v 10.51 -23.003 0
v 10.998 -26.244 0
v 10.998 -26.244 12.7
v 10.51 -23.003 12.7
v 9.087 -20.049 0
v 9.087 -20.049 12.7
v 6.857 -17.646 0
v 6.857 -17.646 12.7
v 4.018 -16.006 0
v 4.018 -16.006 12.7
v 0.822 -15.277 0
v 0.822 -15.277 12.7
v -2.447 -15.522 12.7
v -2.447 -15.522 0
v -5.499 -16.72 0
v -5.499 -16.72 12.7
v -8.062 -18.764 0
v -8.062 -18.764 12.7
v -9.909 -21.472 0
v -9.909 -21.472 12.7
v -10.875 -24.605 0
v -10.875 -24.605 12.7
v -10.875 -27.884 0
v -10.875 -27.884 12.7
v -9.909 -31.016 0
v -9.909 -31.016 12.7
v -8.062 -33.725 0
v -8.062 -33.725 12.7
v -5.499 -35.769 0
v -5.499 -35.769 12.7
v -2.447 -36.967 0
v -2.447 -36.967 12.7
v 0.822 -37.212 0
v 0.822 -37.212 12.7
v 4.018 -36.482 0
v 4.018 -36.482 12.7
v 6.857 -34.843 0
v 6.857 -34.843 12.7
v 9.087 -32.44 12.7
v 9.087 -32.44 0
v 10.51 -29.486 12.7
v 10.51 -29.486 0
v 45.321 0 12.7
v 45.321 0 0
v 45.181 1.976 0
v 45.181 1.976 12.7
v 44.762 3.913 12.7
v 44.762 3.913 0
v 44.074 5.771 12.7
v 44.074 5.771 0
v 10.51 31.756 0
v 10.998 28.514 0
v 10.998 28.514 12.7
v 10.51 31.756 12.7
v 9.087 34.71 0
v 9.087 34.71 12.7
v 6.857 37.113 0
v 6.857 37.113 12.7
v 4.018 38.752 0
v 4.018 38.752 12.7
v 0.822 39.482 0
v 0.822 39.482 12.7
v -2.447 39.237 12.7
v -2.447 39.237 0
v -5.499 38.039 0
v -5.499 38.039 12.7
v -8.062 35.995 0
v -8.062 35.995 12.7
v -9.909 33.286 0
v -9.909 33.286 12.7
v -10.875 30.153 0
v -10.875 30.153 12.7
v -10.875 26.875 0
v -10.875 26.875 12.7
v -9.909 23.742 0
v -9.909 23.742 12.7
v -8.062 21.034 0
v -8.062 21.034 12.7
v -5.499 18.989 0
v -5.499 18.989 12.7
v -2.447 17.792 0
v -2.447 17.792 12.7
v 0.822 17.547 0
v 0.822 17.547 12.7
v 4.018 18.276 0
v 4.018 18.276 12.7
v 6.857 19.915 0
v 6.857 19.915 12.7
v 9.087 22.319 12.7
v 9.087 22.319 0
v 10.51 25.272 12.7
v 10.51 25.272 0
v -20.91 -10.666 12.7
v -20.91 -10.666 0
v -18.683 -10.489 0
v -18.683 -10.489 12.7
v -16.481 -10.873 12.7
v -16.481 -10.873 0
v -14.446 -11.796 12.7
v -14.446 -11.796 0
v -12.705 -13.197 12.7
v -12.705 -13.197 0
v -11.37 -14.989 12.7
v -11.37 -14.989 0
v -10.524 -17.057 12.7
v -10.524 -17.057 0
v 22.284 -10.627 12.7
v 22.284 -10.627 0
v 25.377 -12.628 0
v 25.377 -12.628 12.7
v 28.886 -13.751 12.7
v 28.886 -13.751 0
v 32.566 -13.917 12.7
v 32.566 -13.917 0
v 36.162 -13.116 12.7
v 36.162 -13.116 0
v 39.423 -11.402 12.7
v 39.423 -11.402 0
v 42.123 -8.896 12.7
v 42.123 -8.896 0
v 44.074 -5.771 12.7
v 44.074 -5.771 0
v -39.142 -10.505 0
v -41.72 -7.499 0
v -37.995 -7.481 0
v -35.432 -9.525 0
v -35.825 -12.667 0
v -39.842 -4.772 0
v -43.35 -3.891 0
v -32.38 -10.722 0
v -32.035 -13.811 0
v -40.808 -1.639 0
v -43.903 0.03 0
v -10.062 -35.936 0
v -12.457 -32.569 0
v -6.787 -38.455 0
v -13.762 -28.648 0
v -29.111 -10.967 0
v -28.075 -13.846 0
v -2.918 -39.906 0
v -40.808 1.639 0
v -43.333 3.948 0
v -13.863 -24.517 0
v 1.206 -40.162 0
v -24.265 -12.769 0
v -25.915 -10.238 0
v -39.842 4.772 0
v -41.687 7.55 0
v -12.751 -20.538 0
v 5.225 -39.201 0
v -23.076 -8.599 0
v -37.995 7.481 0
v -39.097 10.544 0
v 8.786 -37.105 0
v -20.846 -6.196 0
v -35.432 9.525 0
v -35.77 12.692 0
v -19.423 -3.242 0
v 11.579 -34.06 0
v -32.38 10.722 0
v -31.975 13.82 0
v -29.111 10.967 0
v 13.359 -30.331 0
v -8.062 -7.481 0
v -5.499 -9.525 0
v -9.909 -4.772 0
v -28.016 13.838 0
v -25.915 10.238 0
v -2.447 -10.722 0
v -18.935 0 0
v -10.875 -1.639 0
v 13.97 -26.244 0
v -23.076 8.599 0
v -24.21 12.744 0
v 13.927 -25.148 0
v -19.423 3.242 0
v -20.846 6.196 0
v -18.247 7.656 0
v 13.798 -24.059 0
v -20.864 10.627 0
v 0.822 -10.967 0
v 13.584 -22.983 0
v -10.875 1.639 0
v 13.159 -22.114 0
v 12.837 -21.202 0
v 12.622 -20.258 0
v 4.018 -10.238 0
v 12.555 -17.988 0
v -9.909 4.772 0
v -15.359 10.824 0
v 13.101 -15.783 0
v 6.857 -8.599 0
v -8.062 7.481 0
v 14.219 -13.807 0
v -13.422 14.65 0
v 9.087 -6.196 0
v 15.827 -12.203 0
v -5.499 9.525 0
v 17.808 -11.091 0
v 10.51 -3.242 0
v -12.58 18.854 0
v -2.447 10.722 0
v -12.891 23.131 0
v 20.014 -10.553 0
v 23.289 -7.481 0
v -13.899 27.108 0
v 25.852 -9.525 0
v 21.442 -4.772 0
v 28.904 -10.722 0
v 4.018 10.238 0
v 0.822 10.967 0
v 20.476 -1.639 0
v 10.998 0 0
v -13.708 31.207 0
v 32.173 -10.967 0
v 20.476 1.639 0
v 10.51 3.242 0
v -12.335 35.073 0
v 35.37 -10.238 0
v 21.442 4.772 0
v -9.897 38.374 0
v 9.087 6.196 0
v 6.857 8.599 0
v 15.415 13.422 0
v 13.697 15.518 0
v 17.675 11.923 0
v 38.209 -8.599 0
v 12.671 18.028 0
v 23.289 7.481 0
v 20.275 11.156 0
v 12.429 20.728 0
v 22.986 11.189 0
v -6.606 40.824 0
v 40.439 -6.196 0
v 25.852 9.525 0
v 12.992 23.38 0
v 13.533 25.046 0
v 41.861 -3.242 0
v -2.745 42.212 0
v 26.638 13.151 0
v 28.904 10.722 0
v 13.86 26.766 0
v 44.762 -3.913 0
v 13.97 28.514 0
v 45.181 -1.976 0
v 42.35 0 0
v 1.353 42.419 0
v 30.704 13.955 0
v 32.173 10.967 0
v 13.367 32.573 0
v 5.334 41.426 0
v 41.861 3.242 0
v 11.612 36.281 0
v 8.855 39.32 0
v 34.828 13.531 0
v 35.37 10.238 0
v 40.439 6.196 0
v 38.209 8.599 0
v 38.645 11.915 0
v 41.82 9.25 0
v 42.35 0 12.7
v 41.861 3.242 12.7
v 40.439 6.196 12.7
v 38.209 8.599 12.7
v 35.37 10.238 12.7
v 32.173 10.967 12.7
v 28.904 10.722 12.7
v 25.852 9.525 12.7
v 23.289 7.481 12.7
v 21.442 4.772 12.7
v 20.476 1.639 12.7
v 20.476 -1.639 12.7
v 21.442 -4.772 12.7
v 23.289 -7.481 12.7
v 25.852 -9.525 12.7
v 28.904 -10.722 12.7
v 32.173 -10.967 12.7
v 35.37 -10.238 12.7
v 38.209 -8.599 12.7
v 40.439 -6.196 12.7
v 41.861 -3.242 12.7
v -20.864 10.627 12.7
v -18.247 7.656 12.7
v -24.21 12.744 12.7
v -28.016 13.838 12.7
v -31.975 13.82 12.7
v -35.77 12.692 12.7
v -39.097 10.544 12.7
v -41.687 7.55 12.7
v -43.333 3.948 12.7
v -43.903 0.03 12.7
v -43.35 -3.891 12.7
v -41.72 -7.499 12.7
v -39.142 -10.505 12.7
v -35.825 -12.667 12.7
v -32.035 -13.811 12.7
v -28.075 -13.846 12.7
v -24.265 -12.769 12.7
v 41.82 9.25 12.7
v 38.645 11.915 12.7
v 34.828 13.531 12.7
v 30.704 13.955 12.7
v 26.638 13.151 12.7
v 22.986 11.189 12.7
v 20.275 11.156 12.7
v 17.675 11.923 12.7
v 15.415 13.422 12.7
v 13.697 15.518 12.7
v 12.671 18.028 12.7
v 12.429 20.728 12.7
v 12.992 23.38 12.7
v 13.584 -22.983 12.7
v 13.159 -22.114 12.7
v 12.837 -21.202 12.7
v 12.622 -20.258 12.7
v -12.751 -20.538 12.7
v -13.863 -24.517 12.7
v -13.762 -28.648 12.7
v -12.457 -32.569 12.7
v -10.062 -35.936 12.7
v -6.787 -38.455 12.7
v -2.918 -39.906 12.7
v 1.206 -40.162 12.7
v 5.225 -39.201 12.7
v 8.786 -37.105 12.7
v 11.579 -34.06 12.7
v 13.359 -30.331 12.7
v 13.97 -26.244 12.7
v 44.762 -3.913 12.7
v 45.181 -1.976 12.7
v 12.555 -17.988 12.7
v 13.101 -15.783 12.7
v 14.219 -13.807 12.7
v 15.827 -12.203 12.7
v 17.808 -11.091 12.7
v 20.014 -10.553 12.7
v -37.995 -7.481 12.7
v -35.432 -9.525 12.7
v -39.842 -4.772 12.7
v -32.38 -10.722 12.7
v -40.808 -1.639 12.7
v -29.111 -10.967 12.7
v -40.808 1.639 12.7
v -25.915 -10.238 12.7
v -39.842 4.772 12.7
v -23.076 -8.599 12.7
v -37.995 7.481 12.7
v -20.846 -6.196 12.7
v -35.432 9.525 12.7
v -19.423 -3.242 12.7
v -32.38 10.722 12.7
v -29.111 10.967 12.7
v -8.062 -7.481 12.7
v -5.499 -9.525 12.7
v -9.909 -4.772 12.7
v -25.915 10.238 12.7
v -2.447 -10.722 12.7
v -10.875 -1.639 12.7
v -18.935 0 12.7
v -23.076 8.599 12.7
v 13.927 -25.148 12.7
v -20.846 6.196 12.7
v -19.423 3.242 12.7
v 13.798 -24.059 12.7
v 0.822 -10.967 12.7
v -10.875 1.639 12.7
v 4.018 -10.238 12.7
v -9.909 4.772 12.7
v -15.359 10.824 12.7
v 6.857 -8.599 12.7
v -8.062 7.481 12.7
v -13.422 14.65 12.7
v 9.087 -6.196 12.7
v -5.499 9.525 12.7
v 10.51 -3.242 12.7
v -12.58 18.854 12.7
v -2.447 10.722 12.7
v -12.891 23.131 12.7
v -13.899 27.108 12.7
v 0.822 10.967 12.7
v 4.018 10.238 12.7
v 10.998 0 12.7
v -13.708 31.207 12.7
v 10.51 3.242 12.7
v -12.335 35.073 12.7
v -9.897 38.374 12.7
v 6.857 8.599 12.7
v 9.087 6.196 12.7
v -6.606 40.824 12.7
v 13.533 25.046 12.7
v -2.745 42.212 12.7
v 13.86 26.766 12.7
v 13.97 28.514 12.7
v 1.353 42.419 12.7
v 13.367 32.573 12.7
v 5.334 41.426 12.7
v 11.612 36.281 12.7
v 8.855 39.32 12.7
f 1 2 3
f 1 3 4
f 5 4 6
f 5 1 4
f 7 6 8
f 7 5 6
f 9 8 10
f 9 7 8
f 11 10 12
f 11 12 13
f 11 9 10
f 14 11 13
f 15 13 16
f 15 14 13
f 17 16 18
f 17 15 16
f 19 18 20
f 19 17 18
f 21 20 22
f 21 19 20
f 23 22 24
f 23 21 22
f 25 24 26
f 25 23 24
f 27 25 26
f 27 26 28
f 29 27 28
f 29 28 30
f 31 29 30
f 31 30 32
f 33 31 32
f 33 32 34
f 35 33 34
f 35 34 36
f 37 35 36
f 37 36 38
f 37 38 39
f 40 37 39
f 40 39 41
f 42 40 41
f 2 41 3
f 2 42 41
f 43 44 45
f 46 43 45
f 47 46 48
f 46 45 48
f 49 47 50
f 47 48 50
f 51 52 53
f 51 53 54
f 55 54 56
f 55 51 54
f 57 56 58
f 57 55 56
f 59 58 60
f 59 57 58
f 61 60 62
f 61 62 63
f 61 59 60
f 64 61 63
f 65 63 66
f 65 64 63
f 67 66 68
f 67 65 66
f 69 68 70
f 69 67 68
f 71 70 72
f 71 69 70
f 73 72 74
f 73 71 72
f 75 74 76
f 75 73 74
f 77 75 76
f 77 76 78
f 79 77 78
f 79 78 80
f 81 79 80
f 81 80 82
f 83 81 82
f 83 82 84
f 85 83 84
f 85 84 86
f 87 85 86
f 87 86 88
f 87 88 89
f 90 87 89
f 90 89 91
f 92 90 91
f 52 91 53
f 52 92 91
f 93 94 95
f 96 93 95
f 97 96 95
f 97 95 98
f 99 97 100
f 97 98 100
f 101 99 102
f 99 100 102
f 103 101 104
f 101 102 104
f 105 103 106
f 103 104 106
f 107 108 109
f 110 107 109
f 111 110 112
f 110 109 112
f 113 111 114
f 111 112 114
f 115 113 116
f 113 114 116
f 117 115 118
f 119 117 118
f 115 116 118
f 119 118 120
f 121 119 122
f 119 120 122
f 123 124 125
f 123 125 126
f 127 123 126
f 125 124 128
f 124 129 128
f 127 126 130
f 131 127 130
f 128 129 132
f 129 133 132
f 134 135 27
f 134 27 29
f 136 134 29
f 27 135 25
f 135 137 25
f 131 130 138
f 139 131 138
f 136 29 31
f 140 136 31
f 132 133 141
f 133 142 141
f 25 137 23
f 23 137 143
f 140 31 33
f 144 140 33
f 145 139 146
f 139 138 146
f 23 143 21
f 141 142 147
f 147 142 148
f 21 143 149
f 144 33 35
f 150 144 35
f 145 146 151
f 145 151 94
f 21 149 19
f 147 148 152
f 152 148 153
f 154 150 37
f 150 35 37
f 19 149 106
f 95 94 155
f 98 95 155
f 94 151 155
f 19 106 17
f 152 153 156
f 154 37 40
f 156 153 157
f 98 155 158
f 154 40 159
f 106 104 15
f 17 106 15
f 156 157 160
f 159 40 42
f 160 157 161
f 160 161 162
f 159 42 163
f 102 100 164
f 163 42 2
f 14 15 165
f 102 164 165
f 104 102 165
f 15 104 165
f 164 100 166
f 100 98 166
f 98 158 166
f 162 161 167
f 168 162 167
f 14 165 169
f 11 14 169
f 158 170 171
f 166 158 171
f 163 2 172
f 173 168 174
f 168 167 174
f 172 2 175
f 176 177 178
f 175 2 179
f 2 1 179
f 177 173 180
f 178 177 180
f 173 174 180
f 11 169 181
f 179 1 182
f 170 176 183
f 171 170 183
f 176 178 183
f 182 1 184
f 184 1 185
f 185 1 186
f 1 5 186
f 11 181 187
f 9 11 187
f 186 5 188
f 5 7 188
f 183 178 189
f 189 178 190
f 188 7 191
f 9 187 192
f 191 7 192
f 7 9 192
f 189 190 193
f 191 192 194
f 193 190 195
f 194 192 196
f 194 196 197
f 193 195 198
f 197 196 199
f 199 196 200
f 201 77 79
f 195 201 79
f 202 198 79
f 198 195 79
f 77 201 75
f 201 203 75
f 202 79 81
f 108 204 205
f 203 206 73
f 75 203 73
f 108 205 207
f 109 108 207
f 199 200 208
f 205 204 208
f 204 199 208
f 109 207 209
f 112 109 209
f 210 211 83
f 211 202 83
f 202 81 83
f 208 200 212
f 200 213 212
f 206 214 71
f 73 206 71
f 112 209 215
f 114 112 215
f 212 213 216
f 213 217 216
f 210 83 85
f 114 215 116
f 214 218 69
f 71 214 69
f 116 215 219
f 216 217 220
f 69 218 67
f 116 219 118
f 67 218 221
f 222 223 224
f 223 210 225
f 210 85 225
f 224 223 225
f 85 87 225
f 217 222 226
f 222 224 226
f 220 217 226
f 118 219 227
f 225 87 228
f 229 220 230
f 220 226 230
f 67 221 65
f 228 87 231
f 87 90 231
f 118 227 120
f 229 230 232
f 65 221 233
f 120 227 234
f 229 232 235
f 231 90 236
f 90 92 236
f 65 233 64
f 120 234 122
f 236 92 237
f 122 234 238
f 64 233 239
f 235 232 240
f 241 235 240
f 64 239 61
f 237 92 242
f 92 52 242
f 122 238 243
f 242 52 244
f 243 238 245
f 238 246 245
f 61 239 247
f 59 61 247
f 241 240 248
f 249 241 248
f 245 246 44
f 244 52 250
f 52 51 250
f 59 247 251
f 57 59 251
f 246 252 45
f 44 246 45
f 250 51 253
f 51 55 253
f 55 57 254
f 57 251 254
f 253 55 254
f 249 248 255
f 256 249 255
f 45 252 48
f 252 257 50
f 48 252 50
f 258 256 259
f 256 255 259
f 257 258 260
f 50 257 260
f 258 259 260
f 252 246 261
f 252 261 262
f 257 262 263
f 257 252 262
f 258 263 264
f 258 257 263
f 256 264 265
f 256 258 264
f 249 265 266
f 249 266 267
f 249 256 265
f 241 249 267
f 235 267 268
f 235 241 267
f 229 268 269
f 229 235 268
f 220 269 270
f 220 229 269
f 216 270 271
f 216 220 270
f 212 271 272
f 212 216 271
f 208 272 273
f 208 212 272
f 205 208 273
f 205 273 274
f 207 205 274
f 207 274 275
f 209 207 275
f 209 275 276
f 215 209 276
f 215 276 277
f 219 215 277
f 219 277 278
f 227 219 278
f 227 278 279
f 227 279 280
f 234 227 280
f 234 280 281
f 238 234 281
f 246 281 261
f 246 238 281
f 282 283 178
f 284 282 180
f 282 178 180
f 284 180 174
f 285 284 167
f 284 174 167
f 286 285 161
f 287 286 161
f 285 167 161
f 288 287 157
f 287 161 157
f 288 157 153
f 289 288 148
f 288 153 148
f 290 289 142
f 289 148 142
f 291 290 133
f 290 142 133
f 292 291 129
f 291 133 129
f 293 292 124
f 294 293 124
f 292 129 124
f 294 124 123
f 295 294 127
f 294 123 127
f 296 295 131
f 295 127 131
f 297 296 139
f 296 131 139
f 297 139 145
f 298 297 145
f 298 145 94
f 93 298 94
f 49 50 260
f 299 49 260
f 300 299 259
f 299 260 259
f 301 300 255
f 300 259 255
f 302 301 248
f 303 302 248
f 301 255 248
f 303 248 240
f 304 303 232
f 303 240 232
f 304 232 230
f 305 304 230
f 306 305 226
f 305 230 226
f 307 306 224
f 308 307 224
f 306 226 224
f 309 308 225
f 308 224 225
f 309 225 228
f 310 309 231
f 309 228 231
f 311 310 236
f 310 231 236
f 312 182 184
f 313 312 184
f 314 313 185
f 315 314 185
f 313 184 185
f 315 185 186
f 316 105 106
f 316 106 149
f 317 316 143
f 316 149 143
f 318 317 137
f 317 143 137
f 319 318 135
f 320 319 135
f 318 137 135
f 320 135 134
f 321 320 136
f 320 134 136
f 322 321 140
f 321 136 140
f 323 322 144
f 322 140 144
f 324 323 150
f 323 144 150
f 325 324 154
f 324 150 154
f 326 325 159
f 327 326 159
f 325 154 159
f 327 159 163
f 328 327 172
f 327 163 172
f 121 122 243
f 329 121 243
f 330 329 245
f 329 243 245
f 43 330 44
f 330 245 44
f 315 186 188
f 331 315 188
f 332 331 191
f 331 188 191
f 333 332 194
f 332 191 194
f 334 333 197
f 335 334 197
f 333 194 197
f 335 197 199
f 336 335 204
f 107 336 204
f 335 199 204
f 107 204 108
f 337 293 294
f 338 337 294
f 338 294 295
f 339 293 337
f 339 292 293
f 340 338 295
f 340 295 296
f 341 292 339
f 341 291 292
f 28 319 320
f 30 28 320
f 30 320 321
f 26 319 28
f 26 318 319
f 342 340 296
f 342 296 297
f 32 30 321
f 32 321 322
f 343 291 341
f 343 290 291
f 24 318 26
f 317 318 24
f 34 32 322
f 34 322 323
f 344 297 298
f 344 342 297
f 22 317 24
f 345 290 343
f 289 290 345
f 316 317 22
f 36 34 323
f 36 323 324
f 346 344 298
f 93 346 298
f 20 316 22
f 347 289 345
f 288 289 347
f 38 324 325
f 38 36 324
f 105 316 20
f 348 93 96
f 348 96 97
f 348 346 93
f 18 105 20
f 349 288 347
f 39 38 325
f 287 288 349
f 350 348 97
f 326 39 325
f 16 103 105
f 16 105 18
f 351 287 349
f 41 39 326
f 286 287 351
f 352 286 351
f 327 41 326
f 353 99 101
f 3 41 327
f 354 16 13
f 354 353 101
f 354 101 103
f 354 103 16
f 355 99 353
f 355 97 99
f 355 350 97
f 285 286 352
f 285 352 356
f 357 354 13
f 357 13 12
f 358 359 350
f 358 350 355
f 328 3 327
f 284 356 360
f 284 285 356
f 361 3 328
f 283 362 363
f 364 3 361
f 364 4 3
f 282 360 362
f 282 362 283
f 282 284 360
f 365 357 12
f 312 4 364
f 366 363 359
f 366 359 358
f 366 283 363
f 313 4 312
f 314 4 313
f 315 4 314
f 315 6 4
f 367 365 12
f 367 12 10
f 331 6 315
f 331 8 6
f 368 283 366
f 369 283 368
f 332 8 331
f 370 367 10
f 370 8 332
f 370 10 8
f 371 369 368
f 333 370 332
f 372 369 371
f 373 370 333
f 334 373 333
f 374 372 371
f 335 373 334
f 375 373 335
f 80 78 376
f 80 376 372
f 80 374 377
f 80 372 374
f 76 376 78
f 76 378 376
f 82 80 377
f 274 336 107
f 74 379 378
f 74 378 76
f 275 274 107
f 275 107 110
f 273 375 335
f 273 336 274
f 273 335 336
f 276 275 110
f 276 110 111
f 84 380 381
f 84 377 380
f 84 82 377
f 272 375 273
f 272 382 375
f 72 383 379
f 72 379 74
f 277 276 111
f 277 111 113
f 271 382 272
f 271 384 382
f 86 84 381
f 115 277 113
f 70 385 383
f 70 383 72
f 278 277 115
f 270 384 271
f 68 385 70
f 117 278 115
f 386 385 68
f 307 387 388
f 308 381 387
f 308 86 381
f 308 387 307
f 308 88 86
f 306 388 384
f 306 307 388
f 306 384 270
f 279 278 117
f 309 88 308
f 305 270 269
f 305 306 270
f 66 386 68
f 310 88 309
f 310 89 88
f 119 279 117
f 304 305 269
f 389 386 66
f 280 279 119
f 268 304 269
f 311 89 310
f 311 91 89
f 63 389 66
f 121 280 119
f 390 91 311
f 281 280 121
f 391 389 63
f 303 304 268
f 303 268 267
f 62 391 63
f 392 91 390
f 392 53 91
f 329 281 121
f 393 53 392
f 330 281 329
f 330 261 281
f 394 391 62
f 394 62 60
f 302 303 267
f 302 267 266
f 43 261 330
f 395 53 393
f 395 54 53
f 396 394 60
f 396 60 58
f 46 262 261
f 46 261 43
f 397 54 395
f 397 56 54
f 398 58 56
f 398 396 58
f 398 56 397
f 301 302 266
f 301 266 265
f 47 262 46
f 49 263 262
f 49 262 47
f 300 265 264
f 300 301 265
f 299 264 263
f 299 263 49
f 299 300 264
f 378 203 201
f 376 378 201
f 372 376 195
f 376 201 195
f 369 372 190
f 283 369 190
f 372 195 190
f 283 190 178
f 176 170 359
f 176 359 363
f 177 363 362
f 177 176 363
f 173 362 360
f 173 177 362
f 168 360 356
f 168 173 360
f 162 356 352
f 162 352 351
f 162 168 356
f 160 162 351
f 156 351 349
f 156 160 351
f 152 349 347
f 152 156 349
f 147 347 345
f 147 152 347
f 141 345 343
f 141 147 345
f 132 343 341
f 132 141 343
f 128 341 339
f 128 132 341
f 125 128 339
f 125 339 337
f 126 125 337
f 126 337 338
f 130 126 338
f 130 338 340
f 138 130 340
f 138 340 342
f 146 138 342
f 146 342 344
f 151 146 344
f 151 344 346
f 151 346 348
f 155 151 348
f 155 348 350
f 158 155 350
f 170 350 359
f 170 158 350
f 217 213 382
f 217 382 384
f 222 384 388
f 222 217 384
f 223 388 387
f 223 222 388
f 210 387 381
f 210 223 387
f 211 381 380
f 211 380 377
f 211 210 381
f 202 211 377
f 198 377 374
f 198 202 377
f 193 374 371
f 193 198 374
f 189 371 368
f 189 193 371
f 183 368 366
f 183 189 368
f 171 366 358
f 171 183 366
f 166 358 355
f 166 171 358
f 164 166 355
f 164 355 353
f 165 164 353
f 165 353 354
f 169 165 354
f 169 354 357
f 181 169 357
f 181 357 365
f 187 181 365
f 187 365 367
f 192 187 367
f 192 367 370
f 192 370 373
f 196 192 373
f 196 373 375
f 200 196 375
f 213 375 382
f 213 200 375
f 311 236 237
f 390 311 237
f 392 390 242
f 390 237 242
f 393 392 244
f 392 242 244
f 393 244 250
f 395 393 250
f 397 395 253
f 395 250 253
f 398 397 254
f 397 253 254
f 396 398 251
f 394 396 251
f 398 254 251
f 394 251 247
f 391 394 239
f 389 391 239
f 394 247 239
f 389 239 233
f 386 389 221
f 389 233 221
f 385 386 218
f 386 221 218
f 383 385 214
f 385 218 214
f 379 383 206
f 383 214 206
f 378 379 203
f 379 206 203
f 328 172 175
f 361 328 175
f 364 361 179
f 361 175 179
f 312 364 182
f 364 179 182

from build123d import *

# Parameters (mm, degrees)
F0_R     = 10.9982
F1_DEPTH = 12.7


with BuildPart() as f1:
    # F0 (on Top) → F1 (new body)
    with BuildSketch(Plane.XY):
        with BuildLine():
            ThreePointArc((-12.8911538343, 23.1309812626), (0.1344337077, 14.5448476662), (12.9923672765, 23.3800706565))
            ThreePointArc((12.9923672765, 23.3800706565), (13.7234155889, 25.9010103246), (13.97, 28.5142008215))
            ThreePointArc((13.97, 28.5142008215), (-2.7451303188, 42.2118341767), (-12.8911538343, 23.1309812626))
        make_face()
        with Locations((0, 28.5142008215)):
            Circle(F0_R, mode=Mode.SUBTRACT)
        with BuildLine():
            ThreePointArc((22.2838142213, -10.6272858301), (17.3886665619, 0.4495282156), (22.9861698039, 11.1885336382))
            ThreePointArc((22.9861698039, 11.1885336382), (14.477603867, 14.4056755038), (12.9923672765, 23.3800706565))
            ThreePointArc((12.9923672765, 23.3800706565), (0.1344337077, 14.5448476662), (-12.8911538343, 23.1309812626))
            ThreePointArc((-12.8911538343, 23.1309812626), (-13.4224968925, 14.6502977979), (-18.2472138965, 7.6555552505))
            ThreePointArc((-18.2472138965, 7.6555552505), (-16.5460943978, 3.9945583246), (-15.9628193069, 0))
            ThreePointArc((-15.9628193069, 0), (-17.2599076539, -5.8786231583), (-20.9103082456, -10.6656080065))
            ThreePointArc((-20.9103082456, -10.6656080065), (-14.446049098, -11.7957961727), (-10.5239803599, -17.0571028955))
            ThreePointArc((-10.5239803599, -17.0571028955), (-7.90695155, -14.7274286335), (-4.7925511239, -13.1222084165))
            ThreePointArc((-4.7925511239, -13.1222084165), (-8.0065273621, 11.4479875786), (13.97, 0))
            ThreePointArc((13.97, 0), (11.4479875786, -8.0065273621), (4.7925511239, -13.1222084165))
            ThreePointArc((4.7925511239, -13.1222084165), (9.4100623481, -15.9191262024), (12.6223312654, -20.257961001))
            ThreePointArc((12.6223312654, -20.257961001), (14.9684584098, -12.9500609929), (22.2838142213, -10.6272858301))
        make_face()
        with BuildLine():
            ThreePointArc((44.0738063138, -5.7707969136), (44.3558518724, -2.8915228992), (44.45, 0))
            ThreePointArc((44.45, 0), (44.3558518724, 2.8915228992), (44.0738063138, 5.7707969136))
            ThreePointArc((44.0738063138, 5.7707969136), (34.8276475911, 13.5305885528), (22.9861698039, 11.1885336382))
            ThreePointArc((22.9861698039, 11.1885336382), (17.3886665619, 0.4495282156), (22.2838142213, -10.6272858301))
            ThreePointArc((22.2838142213, -10.6272858301), (34.3904586495, -13.6354397899), (44.0738063138, -5.7707969136))
        make_face()
        with Locations((31.3514322042, 0)):
            Circle(F0_R, mode=Mode.SUBTRACT)
        with BuildLine():
            ThreePointArc((-15.9628193069, 0), (-16.5460943978, 3.9945583246), (-18.2472138965, 7.6555552505))
            ThreePointArc((-18.2472138965, 7.6555552505), (-43.7575354965, 2.0095079688), (-20.9103082456, -10.6656080065))
            ThreePointArc((-20.9103082456, -10.6656080065), (-17.2599076539, -5.8786231583), (-15.9628193069, 0))
        make_face()
        with Locations((-29.9328193069, 0)):
            Circle(F0_R, mode=Mode.SUBTRACT)
        with BuildLine():
            ThreePointArc((13.5840434167, -22.9833335078), (12.9846567282, -21.6624735847), (12.6223312654, -20.257961001))
            ThreePointArc((12.6223312654, -20.257961001), (9.4100623481, -15.9191262024), (4.7925511239, -13.1222084165))
            ThreePointArc((4.7925511239, -13.1222084165), (0, -13.97), (-4.7925511239, -13.1222084165))
            ThreePointArc((-4.7925511239, -13.1222084165), (-7.90695155, -14.7274286335), (-10.5239803599, -17.0571028955))
            ThreePointArc((-10.5239803599, -17.0571028955), (-4.9061642029, -39.3245717561), (13.97, -26.2444168329))
            ThreePointArc((13.97, -26.2444168329), (13.873175313, -24.6024951739), (13.5840434167, -22.9833335078))
        make_face()
        with Locations((0, -26.2444168329)):
            Circle(F0_R, mode=Mode.SUBTRACT)
        with BuildLine():
            ThreePointArc((-4.7925511239, -13.1222084165), (0, -13.97), (4.7925511239, -13.1222084165))
            ThreePointArc((4.7925511239, -13.1222084165), (0, -12.2744168329), (-4.7925511239, -13.1222084165))
        make_face()
        with BuildLine():
            ThreePointArc((-4.7925511239, -13.1222084165), (0, -12.2744168329), (4.7925511239, -13.1222084165))
            ThreePointArc((4.7925511239, -13.1222084165), (11.4479875786, -8.0065273621), (13.97, 0))
            ThreePointArc((13.97, 0), (-8.0065273621, 11.4479875786), (-4.7925511239, -13.1222084165))
        make_face()
        Circle(F0_R, mode=Mode.SUBTRACT)
        with BuildLine():
            ThreePointArc((44.0738063138, 5.7707969136), (44.3558518724, 2.8915228992), (44.45, 0))
            ThreePointArc((44.45, 0), (44.3558518724, -2.8915228992), (44.0738063138, -5.7707969136))
            ThreePointArc((44.0738063138, -5.7707969136), (45.005963802, -2.9520614569), (45.3214322042, 0))
            ThreePointArc((45.3214322042, 0), (45.005963802, 2.9520614569), (44.0738063138, 5.7707969136))
        make_face()
    extrude(amount=F1_DEPTH)


solid = f1.part
